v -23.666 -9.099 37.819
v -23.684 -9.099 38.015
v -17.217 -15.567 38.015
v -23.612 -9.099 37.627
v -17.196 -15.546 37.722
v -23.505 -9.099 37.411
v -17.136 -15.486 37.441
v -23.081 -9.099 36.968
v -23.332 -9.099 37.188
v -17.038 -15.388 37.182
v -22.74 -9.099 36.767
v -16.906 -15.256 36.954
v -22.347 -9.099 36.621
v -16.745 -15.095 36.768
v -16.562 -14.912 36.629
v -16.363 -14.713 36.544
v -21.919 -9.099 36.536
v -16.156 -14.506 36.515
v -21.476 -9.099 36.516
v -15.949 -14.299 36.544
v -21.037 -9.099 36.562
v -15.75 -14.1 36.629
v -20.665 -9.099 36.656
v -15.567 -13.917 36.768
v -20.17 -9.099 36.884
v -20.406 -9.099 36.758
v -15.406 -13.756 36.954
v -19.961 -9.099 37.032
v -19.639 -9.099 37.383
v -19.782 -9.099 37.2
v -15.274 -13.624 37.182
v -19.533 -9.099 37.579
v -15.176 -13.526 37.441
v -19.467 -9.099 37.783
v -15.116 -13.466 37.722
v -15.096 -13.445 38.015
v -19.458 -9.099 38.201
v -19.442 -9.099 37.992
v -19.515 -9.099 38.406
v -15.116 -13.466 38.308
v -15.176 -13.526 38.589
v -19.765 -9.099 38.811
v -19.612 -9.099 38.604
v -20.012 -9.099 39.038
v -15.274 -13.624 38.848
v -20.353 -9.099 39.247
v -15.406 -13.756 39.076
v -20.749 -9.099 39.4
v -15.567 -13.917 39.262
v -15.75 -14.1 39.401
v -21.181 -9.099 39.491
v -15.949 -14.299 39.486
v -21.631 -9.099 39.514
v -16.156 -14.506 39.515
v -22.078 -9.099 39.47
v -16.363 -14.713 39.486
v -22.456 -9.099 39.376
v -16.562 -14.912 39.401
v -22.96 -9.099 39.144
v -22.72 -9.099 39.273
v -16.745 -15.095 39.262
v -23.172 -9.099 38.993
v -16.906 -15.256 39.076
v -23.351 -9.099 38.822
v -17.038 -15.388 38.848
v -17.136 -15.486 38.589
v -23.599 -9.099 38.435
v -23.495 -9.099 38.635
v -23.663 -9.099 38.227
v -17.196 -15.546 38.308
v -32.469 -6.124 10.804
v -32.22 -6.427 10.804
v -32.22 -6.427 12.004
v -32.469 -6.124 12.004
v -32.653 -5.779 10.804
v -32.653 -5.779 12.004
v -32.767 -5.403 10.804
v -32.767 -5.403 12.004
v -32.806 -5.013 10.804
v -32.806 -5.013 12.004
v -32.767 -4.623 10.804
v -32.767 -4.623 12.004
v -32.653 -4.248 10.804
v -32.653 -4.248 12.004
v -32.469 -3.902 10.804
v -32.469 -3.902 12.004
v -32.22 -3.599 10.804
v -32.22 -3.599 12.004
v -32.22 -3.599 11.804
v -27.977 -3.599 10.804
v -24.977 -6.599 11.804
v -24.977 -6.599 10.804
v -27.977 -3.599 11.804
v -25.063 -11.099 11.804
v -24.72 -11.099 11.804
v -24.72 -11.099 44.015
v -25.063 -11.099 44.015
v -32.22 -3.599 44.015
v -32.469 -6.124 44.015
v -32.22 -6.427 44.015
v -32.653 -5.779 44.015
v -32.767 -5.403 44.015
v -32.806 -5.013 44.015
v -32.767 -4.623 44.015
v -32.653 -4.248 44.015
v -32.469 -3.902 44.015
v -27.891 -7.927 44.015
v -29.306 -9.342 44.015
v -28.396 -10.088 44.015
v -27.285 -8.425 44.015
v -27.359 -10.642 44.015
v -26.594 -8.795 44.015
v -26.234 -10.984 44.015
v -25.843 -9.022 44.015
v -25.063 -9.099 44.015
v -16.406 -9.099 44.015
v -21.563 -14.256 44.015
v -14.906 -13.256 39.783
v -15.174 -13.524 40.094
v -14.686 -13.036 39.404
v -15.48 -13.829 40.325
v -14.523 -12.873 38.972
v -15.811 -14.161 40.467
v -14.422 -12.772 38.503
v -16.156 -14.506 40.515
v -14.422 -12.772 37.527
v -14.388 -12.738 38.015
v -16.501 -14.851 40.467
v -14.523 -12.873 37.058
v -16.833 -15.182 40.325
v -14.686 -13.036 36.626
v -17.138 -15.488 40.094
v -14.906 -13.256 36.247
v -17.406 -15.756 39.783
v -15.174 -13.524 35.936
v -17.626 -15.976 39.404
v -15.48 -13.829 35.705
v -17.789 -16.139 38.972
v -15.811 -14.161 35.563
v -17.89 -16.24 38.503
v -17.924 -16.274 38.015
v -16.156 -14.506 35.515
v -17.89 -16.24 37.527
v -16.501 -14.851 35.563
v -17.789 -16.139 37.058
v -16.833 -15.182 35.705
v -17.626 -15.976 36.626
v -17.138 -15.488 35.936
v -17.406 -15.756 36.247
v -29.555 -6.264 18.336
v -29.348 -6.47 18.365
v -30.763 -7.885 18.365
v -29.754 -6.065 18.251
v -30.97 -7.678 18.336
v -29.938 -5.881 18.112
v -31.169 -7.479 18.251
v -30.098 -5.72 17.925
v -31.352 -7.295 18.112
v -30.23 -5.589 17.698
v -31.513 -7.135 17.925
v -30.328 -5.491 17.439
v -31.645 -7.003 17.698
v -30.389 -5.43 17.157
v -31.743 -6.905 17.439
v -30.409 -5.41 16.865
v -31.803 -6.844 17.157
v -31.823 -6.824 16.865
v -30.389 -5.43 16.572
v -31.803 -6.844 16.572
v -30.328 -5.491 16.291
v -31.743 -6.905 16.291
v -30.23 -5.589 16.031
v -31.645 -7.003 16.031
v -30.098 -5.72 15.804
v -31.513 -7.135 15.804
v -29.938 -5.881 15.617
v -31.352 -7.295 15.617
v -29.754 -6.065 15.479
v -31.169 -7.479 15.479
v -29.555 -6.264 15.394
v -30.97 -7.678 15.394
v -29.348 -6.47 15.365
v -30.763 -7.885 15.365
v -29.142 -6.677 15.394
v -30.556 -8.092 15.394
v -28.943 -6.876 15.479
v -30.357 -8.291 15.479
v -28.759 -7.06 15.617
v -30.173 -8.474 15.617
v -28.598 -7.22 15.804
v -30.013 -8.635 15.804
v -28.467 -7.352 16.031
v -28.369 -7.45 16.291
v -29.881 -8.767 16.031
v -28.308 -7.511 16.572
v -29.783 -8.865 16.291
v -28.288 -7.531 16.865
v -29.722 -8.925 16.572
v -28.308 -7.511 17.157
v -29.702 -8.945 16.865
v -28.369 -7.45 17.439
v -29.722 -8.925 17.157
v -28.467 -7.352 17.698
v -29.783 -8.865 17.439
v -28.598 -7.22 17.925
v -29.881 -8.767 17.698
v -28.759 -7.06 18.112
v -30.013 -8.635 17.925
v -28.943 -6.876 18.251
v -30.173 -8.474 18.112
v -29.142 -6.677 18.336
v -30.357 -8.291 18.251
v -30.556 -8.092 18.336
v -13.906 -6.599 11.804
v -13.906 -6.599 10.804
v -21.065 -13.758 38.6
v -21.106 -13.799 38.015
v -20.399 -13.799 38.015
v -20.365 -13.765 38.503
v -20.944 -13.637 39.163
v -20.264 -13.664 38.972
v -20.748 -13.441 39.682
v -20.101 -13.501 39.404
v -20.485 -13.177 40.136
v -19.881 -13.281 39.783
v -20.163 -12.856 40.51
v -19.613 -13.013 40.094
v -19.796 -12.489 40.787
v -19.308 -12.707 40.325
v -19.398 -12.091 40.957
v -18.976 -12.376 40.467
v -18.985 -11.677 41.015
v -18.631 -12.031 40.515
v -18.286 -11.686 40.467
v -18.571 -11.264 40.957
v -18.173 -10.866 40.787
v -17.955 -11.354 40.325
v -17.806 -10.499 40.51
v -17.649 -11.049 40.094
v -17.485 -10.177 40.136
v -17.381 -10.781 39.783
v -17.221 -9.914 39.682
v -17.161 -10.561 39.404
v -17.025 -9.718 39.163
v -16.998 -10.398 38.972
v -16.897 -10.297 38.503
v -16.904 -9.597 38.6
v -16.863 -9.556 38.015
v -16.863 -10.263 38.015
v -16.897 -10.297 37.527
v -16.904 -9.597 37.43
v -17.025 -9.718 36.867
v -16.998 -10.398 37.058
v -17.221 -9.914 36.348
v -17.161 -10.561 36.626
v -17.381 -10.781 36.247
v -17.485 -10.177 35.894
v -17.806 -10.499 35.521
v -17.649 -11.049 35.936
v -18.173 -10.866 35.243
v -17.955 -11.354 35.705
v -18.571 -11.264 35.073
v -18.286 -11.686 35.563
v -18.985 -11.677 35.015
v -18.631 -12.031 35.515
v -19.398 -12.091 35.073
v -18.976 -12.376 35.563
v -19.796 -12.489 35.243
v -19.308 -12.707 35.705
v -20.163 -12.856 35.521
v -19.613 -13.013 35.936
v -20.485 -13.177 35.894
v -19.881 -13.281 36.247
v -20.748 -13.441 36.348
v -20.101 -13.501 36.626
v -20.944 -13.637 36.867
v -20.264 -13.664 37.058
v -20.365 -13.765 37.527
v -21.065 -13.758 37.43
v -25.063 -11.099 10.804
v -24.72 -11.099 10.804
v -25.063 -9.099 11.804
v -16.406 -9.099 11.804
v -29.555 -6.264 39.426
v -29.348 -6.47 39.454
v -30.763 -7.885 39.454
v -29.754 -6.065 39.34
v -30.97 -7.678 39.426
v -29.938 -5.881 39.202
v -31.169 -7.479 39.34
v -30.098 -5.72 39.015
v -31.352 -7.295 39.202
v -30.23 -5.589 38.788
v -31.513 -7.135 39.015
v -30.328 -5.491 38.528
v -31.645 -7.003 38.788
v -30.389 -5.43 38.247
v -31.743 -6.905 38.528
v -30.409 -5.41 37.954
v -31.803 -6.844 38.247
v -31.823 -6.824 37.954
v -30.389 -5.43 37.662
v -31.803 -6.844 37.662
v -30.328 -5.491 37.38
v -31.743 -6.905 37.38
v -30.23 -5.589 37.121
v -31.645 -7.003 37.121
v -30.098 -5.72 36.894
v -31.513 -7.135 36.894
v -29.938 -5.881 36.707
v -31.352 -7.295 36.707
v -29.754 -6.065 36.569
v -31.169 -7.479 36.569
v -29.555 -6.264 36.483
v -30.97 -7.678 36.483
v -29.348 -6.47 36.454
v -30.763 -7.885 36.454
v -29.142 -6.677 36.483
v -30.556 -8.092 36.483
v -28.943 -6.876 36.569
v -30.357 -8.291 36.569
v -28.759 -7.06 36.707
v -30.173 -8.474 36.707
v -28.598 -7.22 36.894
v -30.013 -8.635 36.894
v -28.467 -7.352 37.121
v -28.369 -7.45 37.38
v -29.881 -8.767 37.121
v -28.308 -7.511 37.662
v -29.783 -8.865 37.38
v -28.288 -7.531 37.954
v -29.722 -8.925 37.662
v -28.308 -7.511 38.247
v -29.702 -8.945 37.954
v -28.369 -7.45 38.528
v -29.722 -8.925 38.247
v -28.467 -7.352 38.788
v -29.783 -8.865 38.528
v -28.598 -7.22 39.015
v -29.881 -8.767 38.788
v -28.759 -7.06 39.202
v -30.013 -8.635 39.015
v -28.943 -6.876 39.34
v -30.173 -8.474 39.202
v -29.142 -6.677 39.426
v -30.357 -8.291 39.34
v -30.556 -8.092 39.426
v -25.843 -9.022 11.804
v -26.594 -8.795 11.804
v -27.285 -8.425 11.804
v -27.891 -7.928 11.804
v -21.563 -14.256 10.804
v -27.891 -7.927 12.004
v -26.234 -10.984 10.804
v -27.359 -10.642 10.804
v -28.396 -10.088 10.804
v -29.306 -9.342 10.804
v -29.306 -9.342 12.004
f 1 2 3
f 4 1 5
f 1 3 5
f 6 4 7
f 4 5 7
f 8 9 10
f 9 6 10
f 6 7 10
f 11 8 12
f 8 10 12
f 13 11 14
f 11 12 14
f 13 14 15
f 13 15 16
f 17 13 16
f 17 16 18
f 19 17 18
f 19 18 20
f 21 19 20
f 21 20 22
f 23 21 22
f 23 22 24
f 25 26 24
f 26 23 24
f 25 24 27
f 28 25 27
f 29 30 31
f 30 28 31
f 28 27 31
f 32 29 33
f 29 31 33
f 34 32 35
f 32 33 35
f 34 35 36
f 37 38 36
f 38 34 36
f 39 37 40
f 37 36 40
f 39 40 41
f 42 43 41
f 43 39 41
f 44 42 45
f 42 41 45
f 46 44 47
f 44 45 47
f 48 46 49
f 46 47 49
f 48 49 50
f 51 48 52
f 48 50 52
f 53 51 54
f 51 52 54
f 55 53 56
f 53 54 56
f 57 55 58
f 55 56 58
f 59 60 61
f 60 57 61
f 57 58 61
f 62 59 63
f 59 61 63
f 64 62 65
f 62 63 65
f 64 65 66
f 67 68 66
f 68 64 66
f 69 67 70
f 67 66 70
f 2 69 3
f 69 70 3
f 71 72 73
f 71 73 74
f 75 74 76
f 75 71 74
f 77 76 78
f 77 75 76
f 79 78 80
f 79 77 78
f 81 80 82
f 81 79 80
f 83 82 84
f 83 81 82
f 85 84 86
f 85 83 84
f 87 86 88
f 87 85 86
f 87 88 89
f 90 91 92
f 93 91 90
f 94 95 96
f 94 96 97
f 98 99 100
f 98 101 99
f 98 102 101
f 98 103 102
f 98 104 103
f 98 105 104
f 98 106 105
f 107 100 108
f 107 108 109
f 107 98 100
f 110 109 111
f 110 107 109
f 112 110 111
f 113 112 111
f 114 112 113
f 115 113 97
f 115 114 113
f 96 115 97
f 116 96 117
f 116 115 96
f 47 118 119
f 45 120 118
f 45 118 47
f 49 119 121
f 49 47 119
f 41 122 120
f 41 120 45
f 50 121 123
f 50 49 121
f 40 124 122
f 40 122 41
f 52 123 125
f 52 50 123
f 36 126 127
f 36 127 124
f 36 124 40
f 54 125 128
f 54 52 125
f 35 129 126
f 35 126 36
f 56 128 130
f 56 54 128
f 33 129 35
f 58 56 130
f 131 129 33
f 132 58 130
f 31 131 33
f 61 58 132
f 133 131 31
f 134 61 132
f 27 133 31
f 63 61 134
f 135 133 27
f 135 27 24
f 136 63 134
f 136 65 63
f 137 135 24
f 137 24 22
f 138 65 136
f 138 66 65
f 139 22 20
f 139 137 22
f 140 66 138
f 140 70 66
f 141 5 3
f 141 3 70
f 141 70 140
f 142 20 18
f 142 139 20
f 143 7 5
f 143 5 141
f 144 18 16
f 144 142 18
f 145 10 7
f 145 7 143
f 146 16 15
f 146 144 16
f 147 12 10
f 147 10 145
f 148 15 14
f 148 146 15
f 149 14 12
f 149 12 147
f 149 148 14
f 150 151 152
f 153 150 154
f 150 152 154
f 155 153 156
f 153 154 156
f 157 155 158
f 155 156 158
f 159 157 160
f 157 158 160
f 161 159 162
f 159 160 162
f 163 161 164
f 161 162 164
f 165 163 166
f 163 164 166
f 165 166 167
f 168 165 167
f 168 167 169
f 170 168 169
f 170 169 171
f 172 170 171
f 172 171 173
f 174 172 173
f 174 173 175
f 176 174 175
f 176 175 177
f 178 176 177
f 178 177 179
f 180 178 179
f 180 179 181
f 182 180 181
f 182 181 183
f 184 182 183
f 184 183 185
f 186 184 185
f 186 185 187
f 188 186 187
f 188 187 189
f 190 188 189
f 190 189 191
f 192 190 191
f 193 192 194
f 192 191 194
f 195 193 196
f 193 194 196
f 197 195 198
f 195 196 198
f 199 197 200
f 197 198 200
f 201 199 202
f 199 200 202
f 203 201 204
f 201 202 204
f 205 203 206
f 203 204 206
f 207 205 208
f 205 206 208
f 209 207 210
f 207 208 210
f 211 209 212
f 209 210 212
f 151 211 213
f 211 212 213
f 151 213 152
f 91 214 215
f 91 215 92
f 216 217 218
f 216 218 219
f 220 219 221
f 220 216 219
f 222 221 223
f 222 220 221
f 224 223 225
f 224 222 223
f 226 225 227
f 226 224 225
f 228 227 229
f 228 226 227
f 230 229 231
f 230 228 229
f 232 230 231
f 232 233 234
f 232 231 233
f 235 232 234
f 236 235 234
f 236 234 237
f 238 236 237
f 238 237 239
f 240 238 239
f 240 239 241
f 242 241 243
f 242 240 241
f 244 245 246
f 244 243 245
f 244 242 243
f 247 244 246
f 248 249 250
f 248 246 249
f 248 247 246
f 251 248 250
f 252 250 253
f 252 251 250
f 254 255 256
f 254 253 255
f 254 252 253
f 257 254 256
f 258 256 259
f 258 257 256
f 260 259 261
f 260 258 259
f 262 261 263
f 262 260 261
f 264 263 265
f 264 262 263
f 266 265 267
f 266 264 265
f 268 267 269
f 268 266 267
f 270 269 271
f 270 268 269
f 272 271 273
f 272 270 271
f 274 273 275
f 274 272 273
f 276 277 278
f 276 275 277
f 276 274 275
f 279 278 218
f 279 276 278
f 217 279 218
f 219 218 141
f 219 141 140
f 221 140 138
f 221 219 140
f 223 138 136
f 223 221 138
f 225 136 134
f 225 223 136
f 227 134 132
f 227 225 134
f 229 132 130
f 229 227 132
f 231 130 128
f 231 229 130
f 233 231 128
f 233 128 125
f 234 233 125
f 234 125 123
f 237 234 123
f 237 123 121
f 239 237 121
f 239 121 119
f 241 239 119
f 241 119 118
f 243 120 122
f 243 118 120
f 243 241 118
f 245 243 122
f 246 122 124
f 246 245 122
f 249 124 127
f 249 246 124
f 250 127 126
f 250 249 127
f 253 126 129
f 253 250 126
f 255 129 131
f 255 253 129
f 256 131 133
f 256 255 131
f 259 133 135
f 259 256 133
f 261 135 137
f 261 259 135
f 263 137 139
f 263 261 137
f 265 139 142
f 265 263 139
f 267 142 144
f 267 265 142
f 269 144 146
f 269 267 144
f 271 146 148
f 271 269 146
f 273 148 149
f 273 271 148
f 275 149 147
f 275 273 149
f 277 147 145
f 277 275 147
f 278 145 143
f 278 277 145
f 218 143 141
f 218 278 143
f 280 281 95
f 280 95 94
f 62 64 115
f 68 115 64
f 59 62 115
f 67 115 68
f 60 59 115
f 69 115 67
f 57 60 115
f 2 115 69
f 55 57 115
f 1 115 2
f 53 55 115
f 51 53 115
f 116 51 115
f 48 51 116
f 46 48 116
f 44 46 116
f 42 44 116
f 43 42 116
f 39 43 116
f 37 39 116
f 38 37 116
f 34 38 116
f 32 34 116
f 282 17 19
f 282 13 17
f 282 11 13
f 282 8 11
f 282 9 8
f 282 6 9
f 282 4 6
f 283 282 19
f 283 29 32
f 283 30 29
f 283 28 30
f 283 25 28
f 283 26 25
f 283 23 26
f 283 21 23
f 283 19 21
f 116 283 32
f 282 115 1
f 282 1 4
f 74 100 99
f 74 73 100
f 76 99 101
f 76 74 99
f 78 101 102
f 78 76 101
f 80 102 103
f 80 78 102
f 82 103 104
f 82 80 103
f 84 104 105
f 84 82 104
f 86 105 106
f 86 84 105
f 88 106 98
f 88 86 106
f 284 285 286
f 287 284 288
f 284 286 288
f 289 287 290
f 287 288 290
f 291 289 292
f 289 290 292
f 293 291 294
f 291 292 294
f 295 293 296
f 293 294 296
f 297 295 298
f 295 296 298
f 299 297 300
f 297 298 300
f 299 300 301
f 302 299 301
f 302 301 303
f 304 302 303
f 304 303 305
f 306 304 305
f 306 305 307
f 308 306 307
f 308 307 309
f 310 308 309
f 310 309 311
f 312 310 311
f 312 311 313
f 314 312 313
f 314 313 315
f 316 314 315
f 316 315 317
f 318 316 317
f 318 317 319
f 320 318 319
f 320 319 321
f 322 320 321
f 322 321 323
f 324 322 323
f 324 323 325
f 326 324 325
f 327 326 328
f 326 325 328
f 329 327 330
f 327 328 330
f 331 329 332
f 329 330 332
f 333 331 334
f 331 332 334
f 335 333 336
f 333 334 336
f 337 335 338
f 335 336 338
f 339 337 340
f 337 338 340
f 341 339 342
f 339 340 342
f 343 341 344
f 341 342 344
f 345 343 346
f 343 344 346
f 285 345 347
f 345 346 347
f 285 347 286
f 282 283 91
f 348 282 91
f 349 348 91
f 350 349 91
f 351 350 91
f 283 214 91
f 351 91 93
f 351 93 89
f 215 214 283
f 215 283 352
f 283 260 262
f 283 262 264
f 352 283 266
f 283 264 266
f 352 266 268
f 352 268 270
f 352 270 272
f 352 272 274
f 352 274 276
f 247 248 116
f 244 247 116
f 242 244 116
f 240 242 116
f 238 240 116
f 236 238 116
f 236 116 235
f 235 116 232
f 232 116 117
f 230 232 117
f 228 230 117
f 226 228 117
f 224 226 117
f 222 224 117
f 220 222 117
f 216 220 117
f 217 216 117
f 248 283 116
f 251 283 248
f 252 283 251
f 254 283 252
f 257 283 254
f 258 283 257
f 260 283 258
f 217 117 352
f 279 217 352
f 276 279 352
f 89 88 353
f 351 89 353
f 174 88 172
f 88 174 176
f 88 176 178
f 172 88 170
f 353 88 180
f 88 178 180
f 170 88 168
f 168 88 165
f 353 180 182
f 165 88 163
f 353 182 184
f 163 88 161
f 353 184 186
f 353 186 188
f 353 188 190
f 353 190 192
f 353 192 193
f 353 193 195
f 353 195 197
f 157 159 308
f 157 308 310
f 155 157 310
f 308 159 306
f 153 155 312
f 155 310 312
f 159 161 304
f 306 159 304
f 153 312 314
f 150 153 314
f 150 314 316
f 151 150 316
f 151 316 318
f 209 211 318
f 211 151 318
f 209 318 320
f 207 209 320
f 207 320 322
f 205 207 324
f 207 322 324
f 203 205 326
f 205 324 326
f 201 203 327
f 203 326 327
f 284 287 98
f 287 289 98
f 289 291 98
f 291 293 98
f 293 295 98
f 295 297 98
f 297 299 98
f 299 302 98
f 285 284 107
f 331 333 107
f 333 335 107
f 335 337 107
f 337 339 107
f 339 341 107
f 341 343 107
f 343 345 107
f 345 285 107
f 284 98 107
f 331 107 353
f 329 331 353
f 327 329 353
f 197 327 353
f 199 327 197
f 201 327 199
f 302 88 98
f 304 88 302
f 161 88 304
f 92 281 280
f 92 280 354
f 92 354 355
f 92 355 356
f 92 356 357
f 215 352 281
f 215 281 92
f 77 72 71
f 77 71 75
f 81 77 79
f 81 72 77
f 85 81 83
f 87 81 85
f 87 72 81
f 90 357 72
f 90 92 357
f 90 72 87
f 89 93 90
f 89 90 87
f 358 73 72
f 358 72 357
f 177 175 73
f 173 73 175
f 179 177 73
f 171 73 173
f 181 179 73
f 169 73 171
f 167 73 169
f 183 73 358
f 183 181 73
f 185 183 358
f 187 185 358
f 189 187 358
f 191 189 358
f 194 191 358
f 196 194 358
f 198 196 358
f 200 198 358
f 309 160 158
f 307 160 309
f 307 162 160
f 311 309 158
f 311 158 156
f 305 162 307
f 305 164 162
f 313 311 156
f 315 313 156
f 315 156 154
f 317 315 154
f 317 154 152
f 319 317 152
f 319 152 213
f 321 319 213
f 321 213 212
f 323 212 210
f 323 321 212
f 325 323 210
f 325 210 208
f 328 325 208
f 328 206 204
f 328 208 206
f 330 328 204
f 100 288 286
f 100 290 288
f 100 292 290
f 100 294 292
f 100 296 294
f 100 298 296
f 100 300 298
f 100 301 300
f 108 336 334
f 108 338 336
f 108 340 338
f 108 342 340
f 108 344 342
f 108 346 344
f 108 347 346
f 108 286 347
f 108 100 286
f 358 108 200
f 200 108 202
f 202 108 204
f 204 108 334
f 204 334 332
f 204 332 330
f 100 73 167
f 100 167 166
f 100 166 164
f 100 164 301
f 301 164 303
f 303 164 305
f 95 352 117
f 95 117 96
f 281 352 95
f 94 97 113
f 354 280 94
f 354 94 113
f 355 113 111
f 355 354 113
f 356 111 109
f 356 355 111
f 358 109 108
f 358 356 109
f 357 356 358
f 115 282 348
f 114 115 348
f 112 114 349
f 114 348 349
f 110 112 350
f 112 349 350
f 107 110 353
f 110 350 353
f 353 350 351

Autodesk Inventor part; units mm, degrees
ref_plane "YZ Plane" through (0, 0, 0) normal (1, 0, 0) x (0, 1, 0)
ref_plane "XZ Plane" through (0, 0, 0) normal (0, 1, 0) x (-1, 0, 0)
ref_plane "XY Plane" through (0, 0, 0) normal (0, 0, 1) x (1, 0, 0)
ref_plane "Work Plane1" through (-26.7198, -9.0991, 72.4417) normal (-0.7071068, -0.7071068, 0) x (0.7071068, -0.7071068, 0)
sketch "Sketch1" plane through (-26.7198, -9.0991, 72.4417) normal (-0.7071068, -0.7071068, 0) x (0.7071068, -0.7071068, 0)
  line L0 (-1.6569, 2.5) -> (-1.6569, -60.4376) projected
  line L1 (-15.5563, 2.5) -> (-1.6569, 2.5) projected
  line L2 (-15.5563, 2.5) -> (-15.5563, 0) projected
  line L3 (-7.7782, 0) -> (-15.5563, 0) projected
  line L4 (-7.7782, -60.4376) -> (-7.7782, 0) projected
  line L5 (-7.7782, -60.4376) -> (-1.6569, -60.4376) projected
  circle A0 centre (58.298, -34.4266) radius 35
  line L6 (58.298, -34.4266) -> (-7.7782, -34.4266)
  line L7 (58.298, -34.4266) -> (124.3741, -34.4266) construction
  line L8 (-7.7782, -28.4266) -> (58.298, -28.4266)
  line L9 (58.298, -28.4266) -> (124.3741, -28.4266)
  point P0 (12.4597, -72.4417)
  point P1 (-1.6569, -28.4266)
  point P2 (-7.7782, -28.4266)
  dimension "d0" = 180
  dimension "d1" = 6
extrude "Extrusion1" add sketch "Sketch1" along normal blind 2 contours L0 L6 L4 L8 | L0 L5 L4 L6
sketch "Sketch2" plane through (-27.8914, -7.9275, 12.0041) normal (0, 0, -1) x (-0.7071068, -0.7071068, 0)
  line L0 (0, 6.1213) -> (0, 0) projected
  line L1 (0, 0) -> (2, 0) projected
  line L2 (2, 6.1213) -> (2, 0) projected
  line L3 (0, 6.1213) -> (2, 6.1213) projected
  point P0 (-25.3278, -14.1166)
extrude "Extrusion2" add sketch "Sketch2" along normal blind 0.2
sketch "Sketch3" plane through (-27.8914, -7.9275, 11.8041) normal (0, 0, -1) x (-0.7071068, 0.7071068, 0)
  arc A0 (-2.8284, 1.1716) -> (0, 0) centre (0, 4) ccw projected
  line L0 (6.1213, 0) -> (0, 0) projected
  line L1 (-2.8284, 1.1716) -> (-54.1742, 52.5173) projected
  line L2 (0, -2) -> (6.1213, -2) projected
  line L3 (0, 0) -> (0, -2) projected
  line L4 (-55.5884, 51.1031) -> (-4.2426, -0.2426)
  arc A1 (-4.2426, -0.2426) -> (0, -2) centre (0, 4) ccw
  line L5 (-9.2664, 7.2928) -> (-12.0609, 7.2928) projected
  line L6 (-9.2664, 7.2928) -> (5.6067, 7.2928) projected
  line L7 (-12.5609, 16.1266) -> (-12.5609, 10.1266) projected
  line L8 (-8.9496, 7.2928) -> (-8.9496, 0)
  line L9 (-8.9496, 7.2928) -> (-1.6569, 7.2928) construction
  line L10 (-8.9496, 0) -> (-4.4721, 0)
  line L11 (-8.9496, 0) -> (-4.4721, 0) construction
  point P0 (-14.1166, 25.3278)
  point P1 (-4.4853, 0)
  dimension "d6" = 2
  dimension "d7" = 90
  dimension "d8" = 0
extrude "Extrusion3" add sketch "Sketch3" against normal up to surface (32.211 mm away) contours A0 L3 A1 L4 L8 L1 | L4 L10 L8
sketch "Sketch4" plane through (-27.8914, -7.9275, 11.8041) normal (0, 0, -1) x (-0.7071068, 0.7071068, 0)
  line L0 (6.1213, 0) -> (0, 0) projected
  arc A0 (-2.8284, 1.1716) -> (0, 0) centre (0, 4) ccw projected
  line L1 (-2.8284, 1.1716) -> (-8.9496, 7.2928) projected
  line L2 (-8.9496, 7.2928) -> (-8.9496, 0) projected
  line L3 (-8.9496, 0) -> (-4.4853, 0) projected
  line L4 (-4.4853, 0) -> (-4.2426, -0.2426) projected
  arc A1 (-4.2426, -0.2426) -> (0, -2) centre (0, 4) ccw projected
  line L5 (0, -2) -> (6.1213, -2) projected
  line L6 (6.1213, -2) -> (6.1213, 0) projected
  line L7 (3.1213, 3) -> (6.1213, 0) projected
  line L8 (-1.1213, 3) -> (3.1213, 3) projected
  line L9 (-18.8648, 20.7435) -> (-1.1213, 3) projected
  line L10 (-8.9496, 7.2928) -> (-8.9496, 10.8283)
  point P0 (-14.1166, 25.3278)
extrude "Extrusion4" add sketch "Sketch4" along normal blind 1
fillet "Fillet1" radius 2 1 edges at (-33.634, -5.0133, 27.4096)
sketch "Sketch5" plane through (-21.563, -14.2558, 44.0151) normal (0.7071068, -0.7071068, 0) x (-0.7071068, -0.7071068, 0)
  circle A0 centre (-3.6464, 6) radius 2.5 projected
  point P0 (-25.3278, 44.0151)
extrude "Extrusion5" add sketch "Sketch5" along normal blind 4
chamfer "Chamfer1" distance 0.5 angle 45 1 edges at (-17.2169, -9.9097, 38.0151)
sketch "Sketch6" plane through (-16.1562, -14.5059, 38.0151) normal (0.7071068, -0.7071068, 0) x (-0.7071068, -0.7071068, 0)
  circle A0 centre (0, 0) radius 1.5 projected
  point P0 (-21.6814, 38.0151)
extrude "Extrusion6" cut sketch "Sketch6" against normal through all
sketch "Sketch7" plane through (-28.134, -10.5133, 72.4417) normal (-0.7071068, -0.7071068, 0) x (0, 0, 1)
  line L0 (-61.6376, 5.7782) -> (-28.4266, 5.7782) projected
  line L1 (-61.6376, 1.6569) -> (-61.6376, 5.7782) projected
  line L2 (-28.4266, 1.6569) -> (-61.6376, 1.6569) projected
  line L3 (-28.4266, 1.6569) -> (-28.4266, 5.7782) projected
  line L4 (-28.4266, 7.7782) -> (-28.4266, 5.7782) projected
  line L5 (-28.4266, 5.7782) -> (-32.4266, 5.7782)
  line L6 (-32.4266, 5.7782) -> (-32.4266, 1.6569)
  line L7 (-32.4266, 1.6569) -> (-28.4266, 1.6569)
  line L8 (-28.4266, 1.6569) -> (-28.4266, 5.7782)
  circle A0 centre (-34.4873, 3.7175) radius 2.0607
  circle A1 centre (-34.4873, 3.7175) radius 1.5
  point P0 (-72.4417, -12.4597)
  dimension "d21" = 4
  dimension "d22" = 3
extrude "Extrusion7" cut sketch "Sketch7" against normal blind 10 contours A1
sketch "Sketch8" plane through (-28.134, -10.5133, 72.4417) normal (-0.7071068, -0.7071068, 0) x (0, 0, 1)
  circle A0 centre (-34.4873, 3.7175) radius 1.5 projected
  line L0 (-61.6376, 5.7782) -> (-28.4266, 5.7782) projected
  line L1 (-61.6376, 1.6569) -> (-61.6376, 5.7782) projected
  line L2 (-28.4266, 1.6569) -> (-61.6376, 1.6569) projected
  line L3 (-28.4266, 1.6569) -> (-28.4266, 5.7782) projected
  line L4 (-61.6376, 5.7782) -> (-57.6376, 5.7782)
  line L5 (-57.6376, 5.7782) -> (-57.6376, 1.6569)
  line L6 (-57.6376, 1.6569) -> (-61.6376, 1.6569)
  line L7 (-61.6376, 1.6569) -> (-61.6376, 5.7782)
  circle A1 centre (-55.577, 3.7175) radius 2.0607
  circle A2 centre (-55.577, 3.7175) radius 1.5
  point P0 (-72.4417, -12.4597)
  dimension "d25" = 4
  dimension "d26" = 3
extrude "Extrusion8" cut sketch "Sketch8" against normal blind 10 contours A2
properties part number "GripperHandleRight_3DPrint"
